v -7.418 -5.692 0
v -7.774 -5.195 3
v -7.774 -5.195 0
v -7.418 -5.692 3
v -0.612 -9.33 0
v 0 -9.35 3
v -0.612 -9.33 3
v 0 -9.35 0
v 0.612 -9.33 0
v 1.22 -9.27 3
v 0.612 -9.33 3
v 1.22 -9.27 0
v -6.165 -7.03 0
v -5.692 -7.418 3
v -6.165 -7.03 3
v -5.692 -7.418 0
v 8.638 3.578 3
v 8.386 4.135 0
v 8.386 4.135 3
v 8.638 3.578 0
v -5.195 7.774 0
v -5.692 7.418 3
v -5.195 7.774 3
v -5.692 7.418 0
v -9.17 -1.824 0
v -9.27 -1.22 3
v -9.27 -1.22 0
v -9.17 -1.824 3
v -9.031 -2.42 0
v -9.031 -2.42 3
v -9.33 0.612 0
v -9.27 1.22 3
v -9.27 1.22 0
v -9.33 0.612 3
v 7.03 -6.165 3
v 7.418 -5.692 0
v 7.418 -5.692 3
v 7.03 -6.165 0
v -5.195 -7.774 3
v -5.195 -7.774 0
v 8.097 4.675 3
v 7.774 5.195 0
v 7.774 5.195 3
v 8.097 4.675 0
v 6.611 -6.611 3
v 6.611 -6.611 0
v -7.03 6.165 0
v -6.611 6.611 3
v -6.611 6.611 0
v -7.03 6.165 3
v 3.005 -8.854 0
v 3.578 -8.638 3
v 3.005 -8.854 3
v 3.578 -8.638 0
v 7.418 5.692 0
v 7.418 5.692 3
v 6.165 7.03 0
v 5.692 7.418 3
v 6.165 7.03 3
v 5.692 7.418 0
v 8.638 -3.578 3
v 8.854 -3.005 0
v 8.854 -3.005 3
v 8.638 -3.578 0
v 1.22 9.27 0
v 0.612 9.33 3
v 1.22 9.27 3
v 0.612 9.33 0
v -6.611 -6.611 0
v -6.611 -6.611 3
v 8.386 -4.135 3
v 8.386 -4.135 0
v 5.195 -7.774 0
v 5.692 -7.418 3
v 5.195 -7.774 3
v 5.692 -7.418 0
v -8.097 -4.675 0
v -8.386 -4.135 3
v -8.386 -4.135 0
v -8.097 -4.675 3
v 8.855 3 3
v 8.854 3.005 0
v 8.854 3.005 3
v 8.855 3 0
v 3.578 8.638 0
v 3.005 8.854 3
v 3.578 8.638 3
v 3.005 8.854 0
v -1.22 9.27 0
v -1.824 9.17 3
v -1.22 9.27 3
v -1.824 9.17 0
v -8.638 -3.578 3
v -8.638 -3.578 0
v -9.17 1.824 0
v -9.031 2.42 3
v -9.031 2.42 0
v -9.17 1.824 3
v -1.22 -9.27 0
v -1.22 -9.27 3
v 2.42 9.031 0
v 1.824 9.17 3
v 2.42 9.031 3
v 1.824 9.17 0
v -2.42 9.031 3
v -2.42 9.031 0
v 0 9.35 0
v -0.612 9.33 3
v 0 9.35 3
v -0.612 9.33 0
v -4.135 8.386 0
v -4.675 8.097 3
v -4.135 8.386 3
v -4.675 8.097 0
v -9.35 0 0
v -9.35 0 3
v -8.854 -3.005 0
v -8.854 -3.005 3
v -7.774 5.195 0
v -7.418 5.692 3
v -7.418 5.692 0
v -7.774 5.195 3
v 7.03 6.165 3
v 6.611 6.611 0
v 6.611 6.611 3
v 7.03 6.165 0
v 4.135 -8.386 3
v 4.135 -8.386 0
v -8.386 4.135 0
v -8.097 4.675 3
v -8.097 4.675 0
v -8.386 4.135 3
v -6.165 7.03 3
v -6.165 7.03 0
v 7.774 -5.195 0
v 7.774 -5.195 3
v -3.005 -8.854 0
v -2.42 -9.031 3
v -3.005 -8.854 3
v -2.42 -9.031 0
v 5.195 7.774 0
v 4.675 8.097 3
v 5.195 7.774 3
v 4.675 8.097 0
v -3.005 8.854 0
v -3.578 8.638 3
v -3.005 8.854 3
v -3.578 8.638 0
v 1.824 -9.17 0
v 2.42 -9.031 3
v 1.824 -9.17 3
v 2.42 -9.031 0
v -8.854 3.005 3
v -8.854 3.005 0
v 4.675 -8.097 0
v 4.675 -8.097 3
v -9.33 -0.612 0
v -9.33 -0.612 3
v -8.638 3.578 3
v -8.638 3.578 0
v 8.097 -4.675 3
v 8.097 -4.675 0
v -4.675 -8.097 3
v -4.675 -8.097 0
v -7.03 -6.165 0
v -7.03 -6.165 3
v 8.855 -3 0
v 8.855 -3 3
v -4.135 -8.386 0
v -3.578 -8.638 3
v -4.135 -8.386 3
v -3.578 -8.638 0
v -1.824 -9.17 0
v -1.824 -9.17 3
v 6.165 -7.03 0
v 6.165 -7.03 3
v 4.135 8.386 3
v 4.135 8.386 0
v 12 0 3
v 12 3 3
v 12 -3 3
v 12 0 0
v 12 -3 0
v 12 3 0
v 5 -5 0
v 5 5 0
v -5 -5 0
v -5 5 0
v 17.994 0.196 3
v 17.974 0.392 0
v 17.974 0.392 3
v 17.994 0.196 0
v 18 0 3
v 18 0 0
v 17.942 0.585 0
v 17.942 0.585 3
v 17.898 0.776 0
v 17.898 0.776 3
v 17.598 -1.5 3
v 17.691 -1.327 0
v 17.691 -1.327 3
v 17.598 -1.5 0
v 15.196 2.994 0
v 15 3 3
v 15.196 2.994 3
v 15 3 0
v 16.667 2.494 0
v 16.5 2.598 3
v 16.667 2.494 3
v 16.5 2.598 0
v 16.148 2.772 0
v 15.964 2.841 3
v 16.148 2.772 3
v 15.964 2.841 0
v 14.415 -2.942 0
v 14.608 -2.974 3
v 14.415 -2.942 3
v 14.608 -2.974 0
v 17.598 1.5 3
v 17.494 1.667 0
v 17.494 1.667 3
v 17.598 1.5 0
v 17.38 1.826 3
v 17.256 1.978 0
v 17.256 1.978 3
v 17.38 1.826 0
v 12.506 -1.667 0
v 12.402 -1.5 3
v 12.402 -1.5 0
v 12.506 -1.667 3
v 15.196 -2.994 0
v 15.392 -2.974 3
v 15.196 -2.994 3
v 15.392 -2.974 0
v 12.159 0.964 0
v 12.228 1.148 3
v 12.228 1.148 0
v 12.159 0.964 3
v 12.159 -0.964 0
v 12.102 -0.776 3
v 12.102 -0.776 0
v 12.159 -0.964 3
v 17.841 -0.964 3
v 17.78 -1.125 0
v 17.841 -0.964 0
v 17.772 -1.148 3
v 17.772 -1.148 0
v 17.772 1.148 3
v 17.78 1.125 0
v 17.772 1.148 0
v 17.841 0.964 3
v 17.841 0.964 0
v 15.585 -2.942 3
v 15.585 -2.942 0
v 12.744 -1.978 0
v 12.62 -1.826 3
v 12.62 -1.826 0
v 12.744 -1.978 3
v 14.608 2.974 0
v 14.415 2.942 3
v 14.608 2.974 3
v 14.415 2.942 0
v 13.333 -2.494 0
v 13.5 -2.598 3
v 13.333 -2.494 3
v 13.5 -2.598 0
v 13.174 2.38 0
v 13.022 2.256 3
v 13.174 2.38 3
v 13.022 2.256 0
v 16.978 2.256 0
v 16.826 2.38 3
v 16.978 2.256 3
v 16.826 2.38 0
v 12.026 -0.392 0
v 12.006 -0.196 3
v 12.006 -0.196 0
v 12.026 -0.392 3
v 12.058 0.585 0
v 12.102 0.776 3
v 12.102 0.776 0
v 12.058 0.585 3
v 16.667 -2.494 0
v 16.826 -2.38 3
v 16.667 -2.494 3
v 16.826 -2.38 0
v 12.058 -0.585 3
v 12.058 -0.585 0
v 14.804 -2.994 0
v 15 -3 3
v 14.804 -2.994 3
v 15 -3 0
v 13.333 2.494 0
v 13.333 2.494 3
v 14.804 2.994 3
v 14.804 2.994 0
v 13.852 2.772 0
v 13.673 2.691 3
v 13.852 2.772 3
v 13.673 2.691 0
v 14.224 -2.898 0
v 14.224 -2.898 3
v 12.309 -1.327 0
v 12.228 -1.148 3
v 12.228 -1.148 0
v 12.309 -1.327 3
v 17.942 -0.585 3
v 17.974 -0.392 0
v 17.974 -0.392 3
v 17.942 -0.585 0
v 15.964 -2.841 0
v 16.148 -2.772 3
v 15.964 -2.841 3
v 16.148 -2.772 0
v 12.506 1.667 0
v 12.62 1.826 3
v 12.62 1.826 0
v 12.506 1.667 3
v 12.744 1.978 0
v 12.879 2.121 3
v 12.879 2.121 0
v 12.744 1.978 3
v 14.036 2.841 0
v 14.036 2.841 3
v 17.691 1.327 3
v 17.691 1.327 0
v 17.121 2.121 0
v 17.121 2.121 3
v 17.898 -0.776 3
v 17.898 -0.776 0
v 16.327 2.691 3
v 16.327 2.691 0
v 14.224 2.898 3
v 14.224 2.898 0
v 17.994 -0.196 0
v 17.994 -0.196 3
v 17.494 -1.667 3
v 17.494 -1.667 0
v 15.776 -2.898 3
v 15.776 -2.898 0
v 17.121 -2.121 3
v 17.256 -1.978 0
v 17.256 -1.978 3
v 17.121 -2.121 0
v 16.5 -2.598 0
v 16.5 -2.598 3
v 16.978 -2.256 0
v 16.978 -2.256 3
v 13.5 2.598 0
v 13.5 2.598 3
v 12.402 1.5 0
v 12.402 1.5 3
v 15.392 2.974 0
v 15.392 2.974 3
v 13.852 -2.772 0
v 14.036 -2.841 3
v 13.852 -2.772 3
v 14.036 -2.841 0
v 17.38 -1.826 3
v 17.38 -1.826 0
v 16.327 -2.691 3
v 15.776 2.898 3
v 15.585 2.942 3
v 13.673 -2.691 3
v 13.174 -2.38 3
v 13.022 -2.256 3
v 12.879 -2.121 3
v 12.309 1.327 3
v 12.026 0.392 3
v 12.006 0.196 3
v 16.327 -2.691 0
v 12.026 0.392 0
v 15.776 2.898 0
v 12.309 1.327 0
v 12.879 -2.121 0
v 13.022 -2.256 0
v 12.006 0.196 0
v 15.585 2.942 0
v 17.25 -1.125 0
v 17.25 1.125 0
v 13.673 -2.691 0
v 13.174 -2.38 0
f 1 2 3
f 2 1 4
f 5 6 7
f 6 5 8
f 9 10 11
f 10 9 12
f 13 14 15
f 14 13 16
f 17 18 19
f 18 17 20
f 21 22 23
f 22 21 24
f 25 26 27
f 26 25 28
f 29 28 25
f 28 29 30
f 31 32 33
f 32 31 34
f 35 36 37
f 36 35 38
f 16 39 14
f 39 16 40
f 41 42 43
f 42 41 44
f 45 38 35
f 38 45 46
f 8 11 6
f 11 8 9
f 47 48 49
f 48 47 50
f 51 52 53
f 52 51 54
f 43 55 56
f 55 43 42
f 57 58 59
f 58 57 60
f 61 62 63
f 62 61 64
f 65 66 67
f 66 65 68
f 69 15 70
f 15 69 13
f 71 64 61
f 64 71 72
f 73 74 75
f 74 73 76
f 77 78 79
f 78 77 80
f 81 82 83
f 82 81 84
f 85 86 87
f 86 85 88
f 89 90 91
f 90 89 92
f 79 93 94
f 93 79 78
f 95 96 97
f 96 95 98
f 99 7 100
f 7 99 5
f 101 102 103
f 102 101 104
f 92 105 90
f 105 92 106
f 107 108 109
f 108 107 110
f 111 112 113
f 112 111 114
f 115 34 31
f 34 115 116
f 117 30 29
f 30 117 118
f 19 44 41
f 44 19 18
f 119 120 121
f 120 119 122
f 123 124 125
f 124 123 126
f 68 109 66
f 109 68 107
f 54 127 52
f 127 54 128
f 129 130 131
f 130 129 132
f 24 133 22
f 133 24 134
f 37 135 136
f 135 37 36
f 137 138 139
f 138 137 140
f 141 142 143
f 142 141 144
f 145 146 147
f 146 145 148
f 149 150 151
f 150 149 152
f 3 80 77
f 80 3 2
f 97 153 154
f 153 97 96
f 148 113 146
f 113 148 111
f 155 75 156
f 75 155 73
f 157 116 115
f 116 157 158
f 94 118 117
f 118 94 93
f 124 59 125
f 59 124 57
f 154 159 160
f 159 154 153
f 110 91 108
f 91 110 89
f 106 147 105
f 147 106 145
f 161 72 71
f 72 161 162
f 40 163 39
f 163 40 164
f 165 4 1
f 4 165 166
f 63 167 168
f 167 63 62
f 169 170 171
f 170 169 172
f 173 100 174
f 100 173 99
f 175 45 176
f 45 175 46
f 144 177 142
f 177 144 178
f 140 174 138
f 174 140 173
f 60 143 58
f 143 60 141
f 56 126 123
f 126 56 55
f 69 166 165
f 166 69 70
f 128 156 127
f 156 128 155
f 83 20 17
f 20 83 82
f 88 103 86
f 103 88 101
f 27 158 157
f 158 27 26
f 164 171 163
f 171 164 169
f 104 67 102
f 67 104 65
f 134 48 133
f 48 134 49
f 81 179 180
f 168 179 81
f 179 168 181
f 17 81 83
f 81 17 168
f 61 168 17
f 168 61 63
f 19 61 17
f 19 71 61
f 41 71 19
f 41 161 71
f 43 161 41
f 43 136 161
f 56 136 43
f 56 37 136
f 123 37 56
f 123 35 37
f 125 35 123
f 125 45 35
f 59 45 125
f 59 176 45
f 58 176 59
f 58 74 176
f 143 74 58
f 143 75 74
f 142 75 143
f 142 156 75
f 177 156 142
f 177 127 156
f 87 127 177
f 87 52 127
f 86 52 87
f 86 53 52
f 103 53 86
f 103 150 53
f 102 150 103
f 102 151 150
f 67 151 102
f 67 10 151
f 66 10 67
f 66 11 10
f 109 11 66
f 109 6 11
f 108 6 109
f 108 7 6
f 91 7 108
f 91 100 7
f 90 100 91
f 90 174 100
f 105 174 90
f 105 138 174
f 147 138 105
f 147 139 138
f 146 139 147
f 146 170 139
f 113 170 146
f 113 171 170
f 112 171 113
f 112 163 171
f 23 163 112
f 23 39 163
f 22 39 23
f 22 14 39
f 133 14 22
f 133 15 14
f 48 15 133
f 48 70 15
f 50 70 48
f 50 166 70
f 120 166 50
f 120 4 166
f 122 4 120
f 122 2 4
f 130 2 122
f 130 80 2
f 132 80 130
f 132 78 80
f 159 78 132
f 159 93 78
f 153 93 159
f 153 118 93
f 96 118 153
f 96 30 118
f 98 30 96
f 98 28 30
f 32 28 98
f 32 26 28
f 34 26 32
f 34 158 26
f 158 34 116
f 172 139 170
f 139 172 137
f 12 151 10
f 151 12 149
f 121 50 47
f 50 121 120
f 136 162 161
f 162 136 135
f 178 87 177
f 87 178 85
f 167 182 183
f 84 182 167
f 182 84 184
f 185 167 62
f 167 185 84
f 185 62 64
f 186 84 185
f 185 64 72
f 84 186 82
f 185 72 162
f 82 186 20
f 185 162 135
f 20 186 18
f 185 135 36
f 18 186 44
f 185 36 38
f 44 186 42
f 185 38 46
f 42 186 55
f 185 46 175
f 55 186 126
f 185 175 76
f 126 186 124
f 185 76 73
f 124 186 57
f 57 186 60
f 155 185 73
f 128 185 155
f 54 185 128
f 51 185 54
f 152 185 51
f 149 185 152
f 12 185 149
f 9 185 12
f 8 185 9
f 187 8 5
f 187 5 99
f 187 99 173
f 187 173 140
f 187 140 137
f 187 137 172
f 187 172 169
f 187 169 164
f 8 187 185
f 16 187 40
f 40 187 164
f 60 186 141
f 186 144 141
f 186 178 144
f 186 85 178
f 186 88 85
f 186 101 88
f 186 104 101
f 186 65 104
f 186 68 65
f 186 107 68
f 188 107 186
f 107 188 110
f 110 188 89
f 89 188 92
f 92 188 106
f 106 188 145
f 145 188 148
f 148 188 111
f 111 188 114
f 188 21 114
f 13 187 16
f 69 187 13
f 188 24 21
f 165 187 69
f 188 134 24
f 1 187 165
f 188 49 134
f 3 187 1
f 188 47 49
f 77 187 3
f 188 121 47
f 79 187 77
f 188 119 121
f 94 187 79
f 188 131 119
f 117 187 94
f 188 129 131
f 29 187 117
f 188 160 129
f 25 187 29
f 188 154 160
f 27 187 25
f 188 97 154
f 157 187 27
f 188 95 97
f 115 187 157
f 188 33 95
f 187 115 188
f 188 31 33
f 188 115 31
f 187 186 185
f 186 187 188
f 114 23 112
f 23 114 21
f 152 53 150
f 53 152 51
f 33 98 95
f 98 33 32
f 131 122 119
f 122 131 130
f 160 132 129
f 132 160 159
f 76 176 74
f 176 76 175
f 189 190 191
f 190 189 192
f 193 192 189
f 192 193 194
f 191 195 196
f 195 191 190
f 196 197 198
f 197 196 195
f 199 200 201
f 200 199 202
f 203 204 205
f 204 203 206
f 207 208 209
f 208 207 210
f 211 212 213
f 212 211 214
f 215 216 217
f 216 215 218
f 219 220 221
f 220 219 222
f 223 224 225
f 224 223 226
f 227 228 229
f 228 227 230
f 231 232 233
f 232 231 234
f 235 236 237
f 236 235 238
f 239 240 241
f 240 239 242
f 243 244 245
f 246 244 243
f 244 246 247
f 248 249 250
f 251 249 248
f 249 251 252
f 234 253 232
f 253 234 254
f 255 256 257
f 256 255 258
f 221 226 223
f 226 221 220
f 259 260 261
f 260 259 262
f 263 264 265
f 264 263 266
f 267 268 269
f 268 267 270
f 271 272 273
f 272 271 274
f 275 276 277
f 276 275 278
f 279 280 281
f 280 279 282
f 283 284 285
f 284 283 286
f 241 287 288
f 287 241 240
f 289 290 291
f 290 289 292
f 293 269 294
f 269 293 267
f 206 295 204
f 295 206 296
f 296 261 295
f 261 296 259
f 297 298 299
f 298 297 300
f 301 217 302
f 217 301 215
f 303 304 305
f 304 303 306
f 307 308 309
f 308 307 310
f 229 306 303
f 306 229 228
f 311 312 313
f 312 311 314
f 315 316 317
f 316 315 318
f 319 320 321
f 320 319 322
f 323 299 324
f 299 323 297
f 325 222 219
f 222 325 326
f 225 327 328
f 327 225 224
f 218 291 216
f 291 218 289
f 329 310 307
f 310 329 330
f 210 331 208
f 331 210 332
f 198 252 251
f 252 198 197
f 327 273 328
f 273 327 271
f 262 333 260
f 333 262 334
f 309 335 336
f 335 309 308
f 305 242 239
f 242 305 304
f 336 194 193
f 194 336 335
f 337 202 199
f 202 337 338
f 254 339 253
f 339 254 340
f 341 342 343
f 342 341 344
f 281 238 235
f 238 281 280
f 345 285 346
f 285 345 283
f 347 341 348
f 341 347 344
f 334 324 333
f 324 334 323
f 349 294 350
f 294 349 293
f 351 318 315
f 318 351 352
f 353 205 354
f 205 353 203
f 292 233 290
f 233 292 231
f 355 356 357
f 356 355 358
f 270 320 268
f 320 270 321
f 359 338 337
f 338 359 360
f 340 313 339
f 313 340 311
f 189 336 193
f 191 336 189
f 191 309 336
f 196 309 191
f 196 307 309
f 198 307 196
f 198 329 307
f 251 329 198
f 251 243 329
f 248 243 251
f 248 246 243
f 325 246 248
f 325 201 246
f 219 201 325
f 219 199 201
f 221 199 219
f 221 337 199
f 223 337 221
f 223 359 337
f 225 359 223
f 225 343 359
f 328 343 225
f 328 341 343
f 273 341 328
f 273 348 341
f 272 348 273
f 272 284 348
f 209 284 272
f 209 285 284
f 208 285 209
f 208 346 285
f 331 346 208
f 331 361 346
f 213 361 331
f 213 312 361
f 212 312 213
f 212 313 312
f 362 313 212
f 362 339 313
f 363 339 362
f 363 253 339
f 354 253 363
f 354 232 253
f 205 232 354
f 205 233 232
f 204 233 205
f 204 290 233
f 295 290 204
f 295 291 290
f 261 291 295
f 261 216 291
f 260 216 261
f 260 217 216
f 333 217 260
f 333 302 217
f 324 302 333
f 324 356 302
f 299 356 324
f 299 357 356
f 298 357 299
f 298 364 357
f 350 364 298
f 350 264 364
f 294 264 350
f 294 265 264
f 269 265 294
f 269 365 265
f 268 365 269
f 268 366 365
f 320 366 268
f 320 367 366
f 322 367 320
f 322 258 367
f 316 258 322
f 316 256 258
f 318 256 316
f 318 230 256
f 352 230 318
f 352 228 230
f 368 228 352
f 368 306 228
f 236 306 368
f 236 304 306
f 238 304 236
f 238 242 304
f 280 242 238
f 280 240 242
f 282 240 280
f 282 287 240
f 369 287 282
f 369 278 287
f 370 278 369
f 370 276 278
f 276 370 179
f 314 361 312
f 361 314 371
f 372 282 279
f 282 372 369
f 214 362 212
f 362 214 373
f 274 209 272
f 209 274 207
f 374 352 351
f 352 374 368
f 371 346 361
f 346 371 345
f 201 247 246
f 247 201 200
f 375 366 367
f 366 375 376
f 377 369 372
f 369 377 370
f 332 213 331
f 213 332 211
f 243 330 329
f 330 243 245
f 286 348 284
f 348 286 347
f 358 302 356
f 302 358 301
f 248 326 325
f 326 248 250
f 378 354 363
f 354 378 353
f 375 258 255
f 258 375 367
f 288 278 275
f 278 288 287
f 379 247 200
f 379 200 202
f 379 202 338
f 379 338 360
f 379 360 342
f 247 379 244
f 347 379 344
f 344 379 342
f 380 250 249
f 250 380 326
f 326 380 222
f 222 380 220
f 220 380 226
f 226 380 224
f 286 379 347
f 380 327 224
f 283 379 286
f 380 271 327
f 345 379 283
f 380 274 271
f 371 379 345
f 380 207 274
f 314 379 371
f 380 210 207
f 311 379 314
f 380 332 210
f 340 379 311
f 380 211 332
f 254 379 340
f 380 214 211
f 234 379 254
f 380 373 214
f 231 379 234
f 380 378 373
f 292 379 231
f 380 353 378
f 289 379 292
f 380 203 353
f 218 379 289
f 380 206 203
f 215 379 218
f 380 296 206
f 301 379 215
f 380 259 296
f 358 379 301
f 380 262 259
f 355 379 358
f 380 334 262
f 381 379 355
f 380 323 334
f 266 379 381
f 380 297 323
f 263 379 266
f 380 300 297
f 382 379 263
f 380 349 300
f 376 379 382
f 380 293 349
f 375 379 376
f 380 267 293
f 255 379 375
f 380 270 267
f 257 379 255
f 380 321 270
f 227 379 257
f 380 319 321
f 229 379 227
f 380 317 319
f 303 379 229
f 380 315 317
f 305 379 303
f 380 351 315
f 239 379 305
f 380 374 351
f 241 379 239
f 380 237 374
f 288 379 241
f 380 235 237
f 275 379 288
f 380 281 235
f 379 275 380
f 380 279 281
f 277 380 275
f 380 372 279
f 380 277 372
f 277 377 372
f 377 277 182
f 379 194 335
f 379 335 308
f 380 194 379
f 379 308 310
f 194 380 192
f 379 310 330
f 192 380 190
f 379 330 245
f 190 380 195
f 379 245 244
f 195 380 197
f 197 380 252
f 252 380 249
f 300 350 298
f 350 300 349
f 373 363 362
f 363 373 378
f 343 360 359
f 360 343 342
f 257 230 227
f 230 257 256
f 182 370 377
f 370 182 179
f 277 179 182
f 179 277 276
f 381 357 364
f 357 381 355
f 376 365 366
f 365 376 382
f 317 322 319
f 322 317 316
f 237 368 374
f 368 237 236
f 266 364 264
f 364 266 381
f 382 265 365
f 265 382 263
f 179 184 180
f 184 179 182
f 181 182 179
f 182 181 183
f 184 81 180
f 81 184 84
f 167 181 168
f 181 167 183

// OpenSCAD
// Snap-on tubing clip for a 12.7 mm lab stand rod
// Print orientation: flat on the bed, extruded along +Z

// ---------------- Parameters ----------------
ring_od      = 18.7;   // rod ring outer diameter
ring_id      = 12.7;   // rod ring inner diameter
ring_w       = 3;      // rod ring wall thickness
ring_open    = 10;     // width of the -X side opening (y = +/-5)

tube_od      = 6;      // tubing ring outer diameter
tube_id      = 4;      // tubing ring inner diameter
tube_w       = 2;      // tubing ring wall thickness
tube_open    = 4.5;    // width of the +X side opening (y = +/-2.25)

bridge_x0    = 8;      // bridge start (x)
bridge_x1    = 12;     // bridge end (x)
bridge_y     = 6;      // bridge width (y)

eps          = 0.5;    // cutter overshoot past faces
$fn          = 96;     // curve resolution

// ---------------- Model ----------------
difference() {
    union() {
        // Rod ring
        cylinder(d = ring_od, h = ring_w);
        // Tubing ring
        translate([15, 0, 0])
            cylinder(d = tube_od, h = ring_w);
        // Solid bridge between the rings
        translate([bridge_x0, -bridge_y / 2, 0])
            cube([bridge_x1 - bridge_x0, bridge_y, ring_w]);
    }

    // Opening in the rod ring (-X side)
    translate([-ring_open / 2, -5, -eps])
        cube([ring_open, 10, eps]);

    // Opening in the tubing ring (+X side)
    translate([15 + tube_open / 2, -tube_open / 4, -eps])
        cube([tube_open, tube_open / 2, eps]);
}
